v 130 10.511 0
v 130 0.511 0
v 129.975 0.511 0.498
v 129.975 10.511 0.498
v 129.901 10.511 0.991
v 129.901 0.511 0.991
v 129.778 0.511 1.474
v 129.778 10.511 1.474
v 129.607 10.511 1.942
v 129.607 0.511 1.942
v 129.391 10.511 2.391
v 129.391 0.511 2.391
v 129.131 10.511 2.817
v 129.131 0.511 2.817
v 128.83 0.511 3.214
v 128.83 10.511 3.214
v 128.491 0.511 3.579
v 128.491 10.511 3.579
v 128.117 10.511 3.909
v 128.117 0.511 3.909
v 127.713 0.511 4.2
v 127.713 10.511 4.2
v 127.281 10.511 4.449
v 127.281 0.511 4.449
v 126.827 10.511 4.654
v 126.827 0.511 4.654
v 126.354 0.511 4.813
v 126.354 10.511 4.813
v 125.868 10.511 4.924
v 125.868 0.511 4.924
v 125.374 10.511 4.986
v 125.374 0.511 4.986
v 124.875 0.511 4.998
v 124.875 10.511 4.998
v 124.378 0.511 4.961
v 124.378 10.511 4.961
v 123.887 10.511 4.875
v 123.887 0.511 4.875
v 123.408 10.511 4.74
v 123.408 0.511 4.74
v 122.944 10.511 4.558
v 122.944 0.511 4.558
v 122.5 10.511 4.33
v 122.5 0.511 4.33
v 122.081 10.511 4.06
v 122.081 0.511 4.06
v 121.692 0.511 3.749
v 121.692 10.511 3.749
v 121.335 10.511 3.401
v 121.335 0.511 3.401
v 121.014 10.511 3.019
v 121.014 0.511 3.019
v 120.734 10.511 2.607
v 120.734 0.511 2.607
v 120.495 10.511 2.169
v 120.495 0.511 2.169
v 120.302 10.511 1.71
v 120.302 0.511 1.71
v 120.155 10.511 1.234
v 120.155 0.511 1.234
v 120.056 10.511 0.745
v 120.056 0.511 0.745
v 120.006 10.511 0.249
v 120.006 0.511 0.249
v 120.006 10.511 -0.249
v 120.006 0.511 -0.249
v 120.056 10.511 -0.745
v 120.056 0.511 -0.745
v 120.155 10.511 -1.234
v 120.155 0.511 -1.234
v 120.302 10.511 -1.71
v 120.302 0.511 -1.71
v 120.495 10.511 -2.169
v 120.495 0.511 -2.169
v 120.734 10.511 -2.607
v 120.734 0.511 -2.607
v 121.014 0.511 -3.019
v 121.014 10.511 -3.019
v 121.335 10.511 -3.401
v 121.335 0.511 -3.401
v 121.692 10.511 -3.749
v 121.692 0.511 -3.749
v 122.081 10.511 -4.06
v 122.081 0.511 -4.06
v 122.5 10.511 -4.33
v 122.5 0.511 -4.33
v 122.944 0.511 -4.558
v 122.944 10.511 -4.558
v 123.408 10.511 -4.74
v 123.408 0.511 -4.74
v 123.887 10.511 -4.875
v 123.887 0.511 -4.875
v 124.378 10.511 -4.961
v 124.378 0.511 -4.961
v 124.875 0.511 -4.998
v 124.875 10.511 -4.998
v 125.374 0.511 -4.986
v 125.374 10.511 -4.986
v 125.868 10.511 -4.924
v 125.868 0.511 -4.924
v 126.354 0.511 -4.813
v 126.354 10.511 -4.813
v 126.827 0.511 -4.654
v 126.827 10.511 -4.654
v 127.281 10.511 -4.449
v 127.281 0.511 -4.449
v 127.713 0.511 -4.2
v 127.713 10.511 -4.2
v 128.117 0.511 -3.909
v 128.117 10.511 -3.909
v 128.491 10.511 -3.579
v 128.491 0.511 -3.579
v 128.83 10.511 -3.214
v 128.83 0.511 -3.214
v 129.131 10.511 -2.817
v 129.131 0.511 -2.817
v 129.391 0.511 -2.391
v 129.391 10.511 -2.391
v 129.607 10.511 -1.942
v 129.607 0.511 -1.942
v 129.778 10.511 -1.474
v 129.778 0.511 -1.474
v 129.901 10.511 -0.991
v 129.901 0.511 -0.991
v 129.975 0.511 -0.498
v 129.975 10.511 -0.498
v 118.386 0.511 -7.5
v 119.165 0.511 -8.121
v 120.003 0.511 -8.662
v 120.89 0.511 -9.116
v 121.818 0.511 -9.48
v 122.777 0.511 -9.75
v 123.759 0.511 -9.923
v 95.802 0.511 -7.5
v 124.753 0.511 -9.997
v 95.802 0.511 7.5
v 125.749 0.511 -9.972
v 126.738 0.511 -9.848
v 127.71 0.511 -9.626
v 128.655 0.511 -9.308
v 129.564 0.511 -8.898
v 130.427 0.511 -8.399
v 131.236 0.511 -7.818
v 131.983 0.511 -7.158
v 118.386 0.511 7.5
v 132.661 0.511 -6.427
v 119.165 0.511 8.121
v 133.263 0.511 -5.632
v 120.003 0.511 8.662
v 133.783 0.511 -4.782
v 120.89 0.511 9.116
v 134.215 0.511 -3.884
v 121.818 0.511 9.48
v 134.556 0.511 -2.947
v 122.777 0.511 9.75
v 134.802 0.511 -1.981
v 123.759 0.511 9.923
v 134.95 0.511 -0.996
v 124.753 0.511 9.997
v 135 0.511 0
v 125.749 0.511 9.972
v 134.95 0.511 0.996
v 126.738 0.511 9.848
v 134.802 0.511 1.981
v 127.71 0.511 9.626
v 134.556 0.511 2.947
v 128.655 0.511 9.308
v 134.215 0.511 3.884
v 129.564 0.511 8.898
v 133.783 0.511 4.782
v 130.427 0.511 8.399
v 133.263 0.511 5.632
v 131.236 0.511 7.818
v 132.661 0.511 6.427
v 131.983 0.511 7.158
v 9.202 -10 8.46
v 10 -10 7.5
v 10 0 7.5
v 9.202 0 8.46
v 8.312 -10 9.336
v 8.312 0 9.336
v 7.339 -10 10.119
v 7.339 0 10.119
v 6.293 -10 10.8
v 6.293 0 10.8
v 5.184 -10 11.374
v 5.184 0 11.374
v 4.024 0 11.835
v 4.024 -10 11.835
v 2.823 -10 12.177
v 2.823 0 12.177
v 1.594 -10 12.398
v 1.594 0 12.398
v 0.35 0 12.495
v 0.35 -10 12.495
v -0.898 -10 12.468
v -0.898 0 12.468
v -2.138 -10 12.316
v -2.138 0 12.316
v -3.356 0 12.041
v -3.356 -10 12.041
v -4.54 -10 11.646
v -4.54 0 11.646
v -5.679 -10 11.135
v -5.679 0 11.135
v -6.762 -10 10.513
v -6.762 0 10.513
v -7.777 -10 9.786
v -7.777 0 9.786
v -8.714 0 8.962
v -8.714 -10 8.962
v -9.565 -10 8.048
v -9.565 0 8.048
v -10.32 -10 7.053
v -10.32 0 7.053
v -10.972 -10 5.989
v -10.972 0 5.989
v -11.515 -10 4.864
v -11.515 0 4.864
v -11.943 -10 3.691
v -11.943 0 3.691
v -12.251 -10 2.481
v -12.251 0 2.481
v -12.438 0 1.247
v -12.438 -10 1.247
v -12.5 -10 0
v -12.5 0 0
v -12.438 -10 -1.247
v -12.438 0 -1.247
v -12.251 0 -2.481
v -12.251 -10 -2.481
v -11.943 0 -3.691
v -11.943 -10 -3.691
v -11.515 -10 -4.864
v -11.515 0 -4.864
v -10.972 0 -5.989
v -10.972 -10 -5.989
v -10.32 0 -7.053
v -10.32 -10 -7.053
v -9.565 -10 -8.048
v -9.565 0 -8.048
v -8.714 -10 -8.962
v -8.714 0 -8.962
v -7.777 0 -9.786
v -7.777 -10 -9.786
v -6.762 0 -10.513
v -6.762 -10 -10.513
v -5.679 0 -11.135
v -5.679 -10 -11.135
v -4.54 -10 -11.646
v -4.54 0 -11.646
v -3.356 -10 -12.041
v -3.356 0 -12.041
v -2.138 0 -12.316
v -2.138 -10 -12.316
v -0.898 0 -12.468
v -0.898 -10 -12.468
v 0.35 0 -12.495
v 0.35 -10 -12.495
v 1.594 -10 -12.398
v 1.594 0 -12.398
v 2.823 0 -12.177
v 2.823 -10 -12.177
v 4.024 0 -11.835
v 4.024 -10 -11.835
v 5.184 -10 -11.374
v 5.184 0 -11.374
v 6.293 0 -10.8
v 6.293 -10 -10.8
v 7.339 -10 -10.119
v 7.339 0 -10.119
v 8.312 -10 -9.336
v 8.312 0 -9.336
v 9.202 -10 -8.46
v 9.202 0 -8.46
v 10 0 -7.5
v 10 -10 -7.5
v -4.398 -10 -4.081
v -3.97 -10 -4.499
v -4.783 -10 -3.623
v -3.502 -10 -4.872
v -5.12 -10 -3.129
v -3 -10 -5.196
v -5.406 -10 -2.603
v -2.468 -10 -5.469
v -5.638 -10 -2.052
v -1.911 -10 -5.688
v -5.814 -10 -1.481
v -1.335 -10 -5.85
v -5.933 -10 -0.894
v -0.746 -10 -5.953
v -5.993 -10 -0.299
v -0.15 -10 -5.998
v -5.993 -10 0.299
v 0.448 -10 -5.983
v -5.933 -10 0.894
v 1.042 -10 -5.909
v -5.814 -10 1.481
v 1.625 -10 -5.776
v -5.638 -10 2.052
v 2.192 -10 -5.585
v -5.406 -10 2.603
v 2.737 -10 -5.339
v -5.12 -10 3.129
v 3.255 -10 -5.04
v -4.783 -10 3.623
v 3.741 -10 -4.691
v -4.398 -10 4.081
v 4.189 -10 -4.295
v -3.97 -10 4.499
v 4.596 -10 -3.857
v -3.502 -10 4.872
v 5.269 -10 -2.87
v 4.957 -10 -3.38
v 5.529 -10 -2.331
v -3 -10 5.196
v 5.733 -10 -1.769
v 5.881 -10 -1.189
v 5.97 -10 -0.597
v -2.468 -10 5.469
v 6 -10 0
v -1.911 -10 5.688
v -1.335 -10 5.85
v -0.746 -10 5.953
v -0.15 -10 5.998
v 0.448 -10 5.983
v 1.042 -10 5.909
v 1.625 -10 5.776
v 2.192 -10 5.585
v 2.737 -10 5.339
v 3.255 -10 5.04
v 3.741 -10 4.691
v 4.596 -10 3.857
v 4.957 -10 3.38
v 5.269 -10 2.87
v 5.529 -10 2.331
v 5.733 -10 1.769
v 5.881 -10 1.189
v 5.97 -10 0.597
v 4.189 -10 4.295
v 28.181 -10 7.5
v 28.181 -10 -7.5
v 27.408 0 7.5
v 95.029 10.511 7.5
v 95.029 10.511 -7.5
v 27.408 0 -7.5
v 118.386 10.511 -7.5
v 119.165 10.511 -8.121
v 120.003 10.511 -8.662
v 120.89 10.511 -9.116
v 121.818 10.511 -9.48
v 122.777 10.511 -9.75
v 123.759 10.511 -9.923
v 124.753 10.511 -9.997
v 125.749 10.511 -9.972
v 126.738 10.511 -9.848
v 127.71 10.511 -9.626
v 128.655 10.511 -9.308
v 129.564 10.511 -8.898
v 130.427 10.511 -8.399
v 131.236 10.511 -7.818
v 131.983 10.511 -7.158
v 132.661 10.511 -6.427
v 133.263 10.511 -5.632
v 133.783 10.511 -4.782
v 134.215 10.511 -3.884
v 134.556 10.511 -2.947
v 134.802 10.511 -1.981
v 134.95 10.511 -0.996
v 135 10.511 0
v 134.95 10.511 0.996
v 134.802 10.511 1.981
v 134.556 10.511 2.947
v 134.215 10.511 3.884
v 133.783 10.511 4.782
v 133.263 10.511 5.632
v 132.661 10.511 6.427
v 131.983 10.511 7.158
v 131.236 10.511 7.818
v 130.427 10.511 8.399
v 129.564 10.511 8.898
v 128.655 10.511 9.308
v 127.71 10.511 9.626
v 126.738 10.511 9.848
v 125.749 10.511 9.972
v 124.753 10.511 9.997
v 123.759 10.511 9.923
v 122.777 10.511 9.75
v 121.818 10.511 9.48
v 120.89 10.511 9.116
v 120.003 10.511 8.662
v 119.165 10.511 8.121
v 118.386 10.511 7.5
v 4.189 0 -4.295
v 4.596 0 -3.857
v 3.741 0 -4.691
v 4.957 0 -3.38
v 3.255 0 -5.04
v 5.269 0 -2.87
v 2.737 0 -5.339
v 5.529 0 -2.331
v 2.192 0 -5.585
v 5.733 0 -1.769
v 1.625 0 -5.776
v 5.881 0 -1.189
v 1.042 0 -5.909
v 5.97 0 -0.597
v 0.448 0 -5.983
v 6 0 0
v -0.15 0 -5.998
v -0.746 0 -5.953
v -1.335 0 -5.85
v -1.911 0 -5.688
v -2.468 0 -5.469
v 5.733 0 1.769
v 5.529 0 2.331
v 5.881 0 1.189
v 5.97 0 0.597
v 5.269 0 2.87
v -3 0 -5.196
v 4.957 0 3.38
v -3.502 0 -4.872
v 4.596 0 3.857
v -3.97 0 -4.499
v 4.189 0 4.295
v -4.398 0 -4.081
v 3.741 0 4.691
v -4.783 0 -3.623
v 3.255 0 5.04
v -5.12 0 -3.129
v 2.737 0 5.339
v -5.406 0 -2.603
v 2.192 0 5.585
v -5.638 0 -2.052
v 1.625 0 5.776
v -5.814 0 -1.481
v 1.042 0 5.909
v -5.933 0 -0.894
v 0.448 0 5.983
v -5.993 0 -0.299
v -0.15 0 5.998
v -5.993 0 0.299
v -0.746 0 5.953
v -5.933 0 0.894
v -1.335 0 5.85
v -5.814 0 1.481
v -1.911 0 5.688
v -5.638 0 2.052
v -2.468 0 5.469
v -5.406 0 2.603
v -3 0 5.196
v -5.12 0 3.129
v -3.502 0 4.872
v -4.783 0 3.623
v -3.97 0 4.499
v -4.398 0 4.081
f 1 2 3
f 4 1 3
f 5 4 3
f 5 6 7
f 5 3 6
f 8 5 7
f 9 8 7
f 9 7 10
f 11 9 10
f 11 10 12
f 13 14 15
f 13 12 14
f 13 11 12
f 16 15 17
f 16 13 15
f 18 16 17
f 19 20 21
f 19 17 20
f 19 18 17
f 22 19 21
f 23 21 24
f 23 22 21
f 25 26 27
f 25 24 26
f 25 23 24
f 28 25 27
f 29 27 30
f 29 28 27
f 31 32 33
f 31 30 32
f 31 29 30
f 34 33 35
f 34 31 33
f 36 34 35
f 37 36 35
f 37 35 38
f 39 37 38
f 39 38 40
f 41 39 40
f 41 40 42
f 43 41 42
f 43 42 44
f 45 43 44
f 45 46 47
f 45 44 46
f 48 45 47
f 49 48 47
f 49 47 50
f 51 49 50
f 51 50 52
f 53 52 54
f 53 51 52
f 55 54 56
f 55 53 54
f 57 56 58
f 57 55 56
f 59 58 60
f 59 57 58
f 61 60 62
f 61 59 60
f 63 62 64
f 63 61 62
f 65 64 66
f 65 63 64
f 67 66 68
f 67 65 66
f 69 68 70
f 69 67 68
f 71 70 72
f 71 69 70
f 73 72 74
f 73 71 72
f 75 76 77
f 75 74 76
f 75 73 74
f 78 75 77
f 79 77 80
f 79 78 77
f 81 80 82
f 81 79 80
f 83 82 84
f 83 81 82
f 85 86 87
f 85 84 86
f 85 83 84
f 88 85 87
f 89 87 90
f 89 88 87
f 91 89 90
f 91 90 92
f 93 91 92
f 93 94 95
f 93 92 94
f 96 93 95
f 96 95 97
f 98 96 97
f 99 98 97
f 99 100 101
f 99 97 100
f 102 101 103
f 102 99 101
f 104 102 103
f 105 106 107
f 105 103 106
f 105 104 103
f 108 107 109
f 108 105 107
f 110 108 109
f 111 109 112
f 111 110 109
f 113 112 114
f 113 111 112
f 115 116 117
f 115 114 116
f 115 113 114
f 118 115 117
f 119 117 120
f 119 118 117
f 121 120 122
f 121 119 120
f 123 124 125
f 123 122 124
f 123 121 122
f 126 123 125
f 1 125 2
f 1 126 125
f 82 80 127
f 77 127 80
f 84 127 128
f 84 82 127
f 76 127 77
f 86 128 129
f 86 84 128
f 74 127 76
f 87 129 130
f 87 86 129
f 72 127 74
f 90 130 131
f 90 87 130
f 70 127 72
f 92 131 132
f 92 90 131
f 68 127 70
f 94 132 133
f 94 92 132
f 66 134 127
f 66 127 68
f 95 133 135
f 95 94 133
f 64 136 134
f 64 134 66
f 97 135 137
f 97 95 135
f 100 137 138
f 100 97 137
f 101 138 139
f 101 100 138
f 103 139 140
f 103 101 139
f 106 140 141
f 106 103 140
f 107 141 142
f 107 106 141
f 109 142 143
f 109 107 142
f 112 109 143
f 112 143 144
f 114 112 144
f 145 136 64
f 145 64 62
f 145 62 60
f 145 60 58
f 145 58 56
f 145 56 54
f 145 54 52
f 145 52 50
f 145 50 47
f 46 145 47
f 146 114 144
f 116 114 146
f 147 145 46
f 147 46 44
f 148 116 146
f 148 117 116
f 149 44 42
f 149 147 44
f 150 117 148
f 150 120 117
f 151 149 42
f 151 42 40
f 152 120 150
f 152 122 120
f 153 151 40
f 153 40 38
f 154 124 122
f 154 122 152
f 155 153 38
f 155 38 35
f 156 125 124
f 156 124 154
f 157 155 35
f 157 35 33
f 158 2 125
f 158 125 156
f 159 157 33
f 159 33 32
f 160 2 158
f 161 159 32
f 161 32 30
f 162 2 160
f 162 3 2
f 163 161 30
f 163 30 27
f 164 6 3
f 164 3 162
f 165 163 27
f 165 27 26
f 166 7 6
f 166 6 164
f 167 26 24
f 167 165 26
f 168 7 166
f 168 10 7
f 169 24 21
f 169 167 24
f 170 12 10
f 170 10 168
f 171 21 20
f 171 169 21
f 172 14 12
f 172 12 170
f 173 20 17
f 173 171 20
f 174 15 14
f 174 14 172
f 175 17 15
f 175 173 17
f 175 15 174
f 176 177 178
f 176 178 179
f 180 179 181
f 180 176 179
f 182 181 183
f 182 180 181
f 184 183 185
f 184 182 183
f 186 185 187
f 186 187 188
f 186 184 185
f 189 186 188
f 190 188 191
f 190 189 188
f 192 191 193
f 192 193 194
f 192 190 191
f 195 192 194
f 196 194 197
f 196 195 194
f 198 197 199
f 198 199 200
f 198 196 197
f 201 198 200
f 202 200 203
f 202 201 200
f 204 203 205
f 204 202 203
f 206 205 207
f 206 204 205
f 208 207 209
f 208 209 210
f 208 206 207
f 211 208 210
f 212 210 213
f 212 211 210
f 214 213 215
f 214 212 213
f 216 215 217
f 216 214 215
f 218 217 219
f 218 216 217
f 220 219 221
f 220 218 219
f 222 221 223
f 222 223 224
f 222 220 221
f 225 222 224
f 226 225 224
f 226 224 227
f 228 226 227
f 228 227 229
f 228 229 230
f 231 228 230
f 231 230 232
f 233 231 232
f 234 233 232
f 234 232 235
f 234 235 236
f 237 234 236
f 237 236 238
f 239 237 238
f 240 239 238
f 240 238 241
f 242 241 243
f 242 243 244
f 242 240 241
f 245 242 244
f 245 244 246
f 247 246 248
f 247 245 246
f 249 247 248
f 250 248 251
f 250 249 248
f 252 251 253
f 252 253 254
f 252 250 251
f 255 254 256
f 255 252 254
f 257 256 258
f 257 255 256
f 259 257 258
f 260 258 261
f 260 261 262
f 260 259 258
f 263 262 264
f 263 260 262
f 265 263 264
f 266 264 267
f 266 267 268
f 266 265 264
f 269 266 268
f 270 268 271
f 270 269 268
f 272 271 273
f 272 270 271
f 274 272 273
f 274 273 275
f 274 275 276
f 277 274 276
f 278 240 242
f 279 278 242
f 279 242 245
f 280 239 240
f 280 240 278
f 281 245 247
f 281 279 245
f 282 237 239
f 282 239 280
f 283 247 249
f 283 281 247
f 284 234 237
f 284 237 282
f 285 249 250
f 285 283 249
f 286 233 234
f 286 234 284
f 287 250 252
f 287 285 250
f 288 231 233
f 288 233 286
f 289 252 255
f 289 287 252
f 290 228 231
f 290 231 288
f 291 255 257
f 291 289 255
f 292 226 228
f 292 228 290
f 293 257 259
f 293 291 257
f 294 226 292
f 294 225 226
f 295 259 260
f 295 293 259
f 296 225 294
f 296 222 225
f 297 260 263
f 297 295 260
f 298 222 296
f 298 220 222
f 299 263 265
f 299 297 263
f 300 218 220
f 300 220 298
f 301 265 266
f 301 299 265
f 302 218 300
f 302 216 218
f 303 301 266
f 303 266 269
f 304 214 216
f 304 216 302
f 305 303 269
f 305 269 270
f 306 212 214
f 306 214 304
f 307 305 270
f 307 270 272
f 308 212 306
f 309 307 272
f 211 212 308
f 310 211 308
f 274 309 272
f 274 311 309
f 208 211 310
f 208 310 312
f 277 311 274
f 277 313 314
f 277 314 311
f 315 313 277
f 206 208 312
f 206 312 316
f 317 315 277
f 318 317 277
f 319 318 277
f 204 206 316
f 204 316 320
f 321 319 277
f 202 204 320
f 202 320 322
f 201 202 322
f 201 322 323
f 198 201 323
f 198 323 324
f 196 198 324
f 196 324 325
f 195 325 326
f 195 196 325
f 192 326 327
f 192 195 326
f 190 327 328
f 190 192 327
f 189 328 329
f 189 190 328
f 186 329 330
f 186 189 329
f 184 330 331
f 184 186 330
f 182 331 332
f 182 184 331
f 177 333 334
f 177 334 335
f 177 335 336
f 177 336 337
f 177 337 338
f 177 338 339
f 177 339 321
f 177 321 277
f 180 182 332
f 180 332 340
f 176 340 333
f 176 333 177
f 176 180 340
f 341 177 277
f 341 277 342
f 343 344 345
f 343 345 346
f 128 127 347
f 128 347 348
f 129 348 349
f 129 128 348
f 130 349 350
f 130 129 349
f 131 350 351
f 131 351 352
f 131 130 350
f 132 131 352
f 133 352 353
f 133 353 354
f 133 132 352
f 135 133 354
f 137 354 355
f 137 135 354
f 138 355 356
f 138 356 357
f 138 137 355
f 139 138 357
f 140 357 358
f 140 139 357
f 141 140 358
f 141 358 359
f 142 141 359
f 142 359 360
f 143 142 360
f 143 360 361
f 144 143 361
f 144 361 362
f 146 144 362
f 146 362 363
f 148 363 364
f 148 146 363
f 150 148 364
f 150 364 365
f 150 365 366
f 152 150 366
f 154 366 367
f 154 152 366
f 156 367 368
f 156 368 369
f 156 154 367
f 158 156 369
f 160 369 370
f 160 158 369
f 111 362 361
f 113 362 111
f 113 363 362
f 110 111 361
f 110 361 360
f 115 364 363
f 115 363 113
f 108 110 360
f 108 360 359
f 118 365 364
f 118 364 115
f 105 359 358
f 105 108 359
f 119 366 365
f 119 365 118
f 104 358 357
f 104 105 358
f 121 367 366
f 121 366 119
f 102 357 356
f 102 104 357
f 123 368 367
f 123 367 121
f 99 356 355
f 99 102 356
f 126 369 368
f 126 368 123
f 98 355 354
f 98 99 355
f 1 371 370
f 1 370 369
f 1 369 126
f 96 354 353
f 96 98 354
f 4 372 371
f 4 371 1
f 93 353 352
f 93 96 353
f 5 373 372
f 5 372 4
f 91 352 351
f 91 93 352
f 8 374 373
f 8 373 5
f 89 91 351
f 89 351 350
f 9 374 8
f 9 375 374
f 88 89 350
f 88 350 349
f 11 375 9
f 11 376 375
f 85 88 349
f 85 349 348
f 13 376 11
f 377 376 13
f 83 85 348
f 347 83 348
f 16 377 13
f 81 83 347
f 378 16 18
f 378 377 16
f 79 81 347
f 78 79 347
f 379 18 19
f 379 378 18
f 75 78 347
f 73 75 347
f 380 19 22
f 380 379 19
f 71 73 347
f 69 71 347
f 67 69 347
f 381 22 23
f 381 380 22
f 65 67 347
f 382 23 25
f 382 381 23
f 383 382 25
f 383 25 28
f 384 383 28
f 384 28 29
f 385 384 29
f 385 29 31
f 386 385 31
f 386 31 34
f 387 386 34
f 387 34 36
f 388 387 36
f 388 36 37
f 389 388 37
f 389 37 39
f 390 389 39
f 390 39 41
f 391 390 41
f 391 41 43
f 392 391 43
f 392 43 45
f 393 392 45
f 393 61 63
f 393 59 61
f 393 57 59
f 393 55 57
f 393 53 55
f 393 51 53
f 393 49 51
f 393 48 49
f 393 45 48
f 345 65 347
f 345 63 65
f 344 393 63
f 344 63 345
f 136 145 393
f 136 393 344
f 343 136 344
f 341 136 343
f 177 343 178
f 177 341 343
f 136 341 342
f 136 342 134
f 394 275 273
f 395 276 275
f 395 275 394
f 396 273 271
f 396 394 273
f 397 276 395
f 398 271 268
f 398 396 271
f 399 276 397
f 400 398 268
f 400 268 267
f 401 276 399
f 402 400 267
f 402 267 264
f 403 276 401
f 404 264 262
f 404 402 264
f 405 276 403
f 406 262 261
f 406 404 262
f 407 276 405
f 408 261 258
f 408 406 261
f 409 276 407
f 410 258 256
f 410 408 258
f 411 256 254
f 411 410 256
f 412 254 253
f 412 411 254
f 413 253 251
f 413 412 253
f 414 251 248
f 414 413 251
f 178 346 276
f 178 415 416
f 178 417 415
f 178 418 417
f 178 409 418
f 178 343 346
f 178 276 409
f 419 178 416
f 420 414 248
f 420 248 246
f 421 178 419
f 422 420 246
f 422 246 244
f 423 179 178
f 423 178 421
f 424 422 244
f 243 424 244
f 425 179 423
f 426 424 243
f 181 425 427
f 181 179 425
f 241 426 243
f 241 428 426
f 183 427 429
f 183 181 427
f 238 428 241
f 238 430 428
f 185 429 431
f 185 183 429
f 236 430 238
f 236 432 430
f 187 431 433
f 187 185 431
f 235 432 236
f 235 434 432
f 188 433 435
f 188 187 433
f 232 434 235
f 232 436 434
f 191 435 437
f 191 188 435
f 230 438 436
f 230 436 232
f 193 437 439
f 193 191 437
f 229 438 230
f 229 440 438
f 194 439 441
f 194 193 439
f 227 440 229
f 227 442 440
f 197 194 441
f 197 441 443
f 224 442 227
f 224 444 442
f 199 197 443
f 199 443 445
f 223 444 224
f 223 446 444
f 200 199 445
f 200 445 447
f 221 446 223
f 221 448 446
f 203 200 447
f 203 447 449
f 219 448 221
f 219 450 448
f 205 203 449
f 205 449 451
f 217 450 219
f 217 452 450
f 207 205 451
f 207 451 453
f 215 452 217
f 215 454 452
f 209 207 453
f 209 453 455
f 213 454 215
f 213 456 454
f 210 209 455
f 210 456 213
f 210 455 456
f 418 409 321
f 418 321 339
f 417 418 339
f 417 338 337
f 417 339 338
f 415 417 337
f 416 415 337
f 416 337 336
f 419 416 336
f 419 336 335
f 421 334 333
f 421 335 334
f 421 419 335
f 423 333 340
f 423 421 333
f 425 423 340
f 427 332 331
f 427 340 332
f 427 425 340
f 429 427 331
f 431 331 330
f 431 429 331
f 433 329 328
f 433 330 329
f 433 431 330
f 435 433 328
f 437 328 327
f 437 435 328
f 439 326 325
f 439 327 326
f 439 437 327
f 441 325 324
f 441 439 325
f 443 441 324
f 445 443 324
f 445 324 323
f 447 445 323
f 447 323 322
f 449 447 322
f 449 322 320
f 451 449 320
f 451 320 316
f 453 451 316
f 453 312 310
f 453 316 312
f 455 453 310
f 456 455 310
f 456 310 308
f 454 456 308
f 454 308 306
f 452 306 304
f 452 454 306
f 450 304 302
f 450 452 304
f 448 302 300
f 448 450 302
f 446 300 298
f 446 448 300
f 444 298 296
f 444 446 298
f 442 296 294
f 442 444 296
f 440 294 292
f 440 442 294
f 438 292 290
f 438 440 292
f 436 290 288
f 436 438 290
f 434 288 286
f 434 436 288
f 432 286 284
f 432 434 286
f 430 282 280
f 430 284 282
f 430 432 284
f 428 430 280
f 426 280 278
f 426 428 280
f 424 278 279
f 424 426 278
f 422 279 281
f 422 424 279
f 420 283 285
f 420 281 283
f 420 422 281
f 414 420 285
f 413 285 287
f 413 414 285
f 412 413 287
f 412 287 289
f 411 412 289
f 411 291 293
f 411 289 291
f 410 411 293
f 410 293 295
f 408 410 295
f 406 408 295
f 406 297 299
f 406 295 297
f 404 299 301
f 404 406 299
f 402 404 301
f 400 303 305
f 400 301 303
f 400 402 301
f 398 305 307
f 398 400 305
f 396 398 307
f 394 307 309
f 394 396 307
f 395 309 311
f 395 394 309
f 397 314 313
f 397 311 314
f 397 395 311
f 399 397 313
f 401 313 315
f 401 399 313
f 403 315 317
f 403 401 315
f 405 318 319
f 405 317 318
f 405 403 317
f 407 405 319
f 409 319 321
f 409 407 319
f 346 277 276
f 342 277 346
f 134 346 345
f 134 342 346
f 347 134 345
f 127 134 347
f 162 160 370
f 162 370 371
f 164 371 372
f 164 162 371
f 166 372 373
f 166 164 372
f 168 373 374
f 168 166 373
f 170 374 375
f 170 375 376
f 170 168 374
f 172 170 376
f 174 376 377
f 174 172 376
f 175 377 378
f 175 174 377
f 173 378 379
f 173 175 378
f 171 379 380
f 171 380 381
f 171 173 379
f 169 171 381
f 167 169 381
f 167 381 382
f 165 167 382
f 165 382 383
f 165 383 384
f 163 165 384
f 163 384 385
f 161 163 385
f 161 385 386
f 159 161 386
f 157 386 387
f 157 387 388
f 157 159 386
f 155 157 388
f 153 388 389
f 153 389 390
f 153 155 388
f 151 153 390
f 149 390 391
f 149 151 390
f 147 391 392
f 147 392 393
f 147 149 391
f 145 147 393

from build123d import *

# Parameters (mm, degrees)
F0_R     = 5
F0_R_2   = 6
F1_DEPTH = 12.5
F3_DEPTH = 12.5


with BuildPart() as f1:
    # F0 (on Front) → F1 (new body, symmetric)
    with BuildSketch(Plane.XZ):
        with BuildLine():
            ThreePointArc((10, 7.5), (11.858541, 3.952847), (12.5, 0))
            ThreePointArc((12.5, 0), (11.858541, -3.952847), (10, -7.5))
            Line((10, -7.5), (118.385622, -7.5))
            ThreePointArc((118.385622, -7.5), (115, 0), (118.385622, 7.5))
            Line((118.385622, 7.5), (10, 7.5))
        make_face()
        with BuildLine():
            ThreePointArc((135, 0), (129.114378, 9.114378), (118.385622, 7.5))
            ThreePointArc((118.385622, 7.5), (115, 0), (118.385622, -7.5))
            ThreePointArc((118.385622, -7.5), (129.114378, -9.114378), (135, 0))
        make_face()
        with Locations((125, 0)):
            Circle(F0_R, mode=Mode.SUBTRACT)
        with BuildLine():
            ThreePointArc((10, -7.5), (11.858541, -3.952847), (12.5, 0))
            ThreePointArc((12.5, 0), (11.858541, 3.952847), (10, 7.5))
            ThreePointArc((10, 7.5), (-12.5, 0), (10, -7.5))
        make_face()
        Circle(F0_R_2, mode=Mode.SUBTRACT)
    extrude(amount=F1_DEPTH, both=True)

    # F2 (on Top) → F3 (intersect, symmetric)
    with BuildSketch(Plane.XY):
        Polygon((27.408045, 0), (-19.638073, 0), (-19.638073, -10), (28.180582, -10), (95.801556, 0.51067), (143.513262, 0.51067), (143.513262, 10.51067), (95.029019, 10.51067), align=None)
    extrude(amount=F3_DEPTH, both=True, mode=Mode.INTERSECT)


solid = f1.part
